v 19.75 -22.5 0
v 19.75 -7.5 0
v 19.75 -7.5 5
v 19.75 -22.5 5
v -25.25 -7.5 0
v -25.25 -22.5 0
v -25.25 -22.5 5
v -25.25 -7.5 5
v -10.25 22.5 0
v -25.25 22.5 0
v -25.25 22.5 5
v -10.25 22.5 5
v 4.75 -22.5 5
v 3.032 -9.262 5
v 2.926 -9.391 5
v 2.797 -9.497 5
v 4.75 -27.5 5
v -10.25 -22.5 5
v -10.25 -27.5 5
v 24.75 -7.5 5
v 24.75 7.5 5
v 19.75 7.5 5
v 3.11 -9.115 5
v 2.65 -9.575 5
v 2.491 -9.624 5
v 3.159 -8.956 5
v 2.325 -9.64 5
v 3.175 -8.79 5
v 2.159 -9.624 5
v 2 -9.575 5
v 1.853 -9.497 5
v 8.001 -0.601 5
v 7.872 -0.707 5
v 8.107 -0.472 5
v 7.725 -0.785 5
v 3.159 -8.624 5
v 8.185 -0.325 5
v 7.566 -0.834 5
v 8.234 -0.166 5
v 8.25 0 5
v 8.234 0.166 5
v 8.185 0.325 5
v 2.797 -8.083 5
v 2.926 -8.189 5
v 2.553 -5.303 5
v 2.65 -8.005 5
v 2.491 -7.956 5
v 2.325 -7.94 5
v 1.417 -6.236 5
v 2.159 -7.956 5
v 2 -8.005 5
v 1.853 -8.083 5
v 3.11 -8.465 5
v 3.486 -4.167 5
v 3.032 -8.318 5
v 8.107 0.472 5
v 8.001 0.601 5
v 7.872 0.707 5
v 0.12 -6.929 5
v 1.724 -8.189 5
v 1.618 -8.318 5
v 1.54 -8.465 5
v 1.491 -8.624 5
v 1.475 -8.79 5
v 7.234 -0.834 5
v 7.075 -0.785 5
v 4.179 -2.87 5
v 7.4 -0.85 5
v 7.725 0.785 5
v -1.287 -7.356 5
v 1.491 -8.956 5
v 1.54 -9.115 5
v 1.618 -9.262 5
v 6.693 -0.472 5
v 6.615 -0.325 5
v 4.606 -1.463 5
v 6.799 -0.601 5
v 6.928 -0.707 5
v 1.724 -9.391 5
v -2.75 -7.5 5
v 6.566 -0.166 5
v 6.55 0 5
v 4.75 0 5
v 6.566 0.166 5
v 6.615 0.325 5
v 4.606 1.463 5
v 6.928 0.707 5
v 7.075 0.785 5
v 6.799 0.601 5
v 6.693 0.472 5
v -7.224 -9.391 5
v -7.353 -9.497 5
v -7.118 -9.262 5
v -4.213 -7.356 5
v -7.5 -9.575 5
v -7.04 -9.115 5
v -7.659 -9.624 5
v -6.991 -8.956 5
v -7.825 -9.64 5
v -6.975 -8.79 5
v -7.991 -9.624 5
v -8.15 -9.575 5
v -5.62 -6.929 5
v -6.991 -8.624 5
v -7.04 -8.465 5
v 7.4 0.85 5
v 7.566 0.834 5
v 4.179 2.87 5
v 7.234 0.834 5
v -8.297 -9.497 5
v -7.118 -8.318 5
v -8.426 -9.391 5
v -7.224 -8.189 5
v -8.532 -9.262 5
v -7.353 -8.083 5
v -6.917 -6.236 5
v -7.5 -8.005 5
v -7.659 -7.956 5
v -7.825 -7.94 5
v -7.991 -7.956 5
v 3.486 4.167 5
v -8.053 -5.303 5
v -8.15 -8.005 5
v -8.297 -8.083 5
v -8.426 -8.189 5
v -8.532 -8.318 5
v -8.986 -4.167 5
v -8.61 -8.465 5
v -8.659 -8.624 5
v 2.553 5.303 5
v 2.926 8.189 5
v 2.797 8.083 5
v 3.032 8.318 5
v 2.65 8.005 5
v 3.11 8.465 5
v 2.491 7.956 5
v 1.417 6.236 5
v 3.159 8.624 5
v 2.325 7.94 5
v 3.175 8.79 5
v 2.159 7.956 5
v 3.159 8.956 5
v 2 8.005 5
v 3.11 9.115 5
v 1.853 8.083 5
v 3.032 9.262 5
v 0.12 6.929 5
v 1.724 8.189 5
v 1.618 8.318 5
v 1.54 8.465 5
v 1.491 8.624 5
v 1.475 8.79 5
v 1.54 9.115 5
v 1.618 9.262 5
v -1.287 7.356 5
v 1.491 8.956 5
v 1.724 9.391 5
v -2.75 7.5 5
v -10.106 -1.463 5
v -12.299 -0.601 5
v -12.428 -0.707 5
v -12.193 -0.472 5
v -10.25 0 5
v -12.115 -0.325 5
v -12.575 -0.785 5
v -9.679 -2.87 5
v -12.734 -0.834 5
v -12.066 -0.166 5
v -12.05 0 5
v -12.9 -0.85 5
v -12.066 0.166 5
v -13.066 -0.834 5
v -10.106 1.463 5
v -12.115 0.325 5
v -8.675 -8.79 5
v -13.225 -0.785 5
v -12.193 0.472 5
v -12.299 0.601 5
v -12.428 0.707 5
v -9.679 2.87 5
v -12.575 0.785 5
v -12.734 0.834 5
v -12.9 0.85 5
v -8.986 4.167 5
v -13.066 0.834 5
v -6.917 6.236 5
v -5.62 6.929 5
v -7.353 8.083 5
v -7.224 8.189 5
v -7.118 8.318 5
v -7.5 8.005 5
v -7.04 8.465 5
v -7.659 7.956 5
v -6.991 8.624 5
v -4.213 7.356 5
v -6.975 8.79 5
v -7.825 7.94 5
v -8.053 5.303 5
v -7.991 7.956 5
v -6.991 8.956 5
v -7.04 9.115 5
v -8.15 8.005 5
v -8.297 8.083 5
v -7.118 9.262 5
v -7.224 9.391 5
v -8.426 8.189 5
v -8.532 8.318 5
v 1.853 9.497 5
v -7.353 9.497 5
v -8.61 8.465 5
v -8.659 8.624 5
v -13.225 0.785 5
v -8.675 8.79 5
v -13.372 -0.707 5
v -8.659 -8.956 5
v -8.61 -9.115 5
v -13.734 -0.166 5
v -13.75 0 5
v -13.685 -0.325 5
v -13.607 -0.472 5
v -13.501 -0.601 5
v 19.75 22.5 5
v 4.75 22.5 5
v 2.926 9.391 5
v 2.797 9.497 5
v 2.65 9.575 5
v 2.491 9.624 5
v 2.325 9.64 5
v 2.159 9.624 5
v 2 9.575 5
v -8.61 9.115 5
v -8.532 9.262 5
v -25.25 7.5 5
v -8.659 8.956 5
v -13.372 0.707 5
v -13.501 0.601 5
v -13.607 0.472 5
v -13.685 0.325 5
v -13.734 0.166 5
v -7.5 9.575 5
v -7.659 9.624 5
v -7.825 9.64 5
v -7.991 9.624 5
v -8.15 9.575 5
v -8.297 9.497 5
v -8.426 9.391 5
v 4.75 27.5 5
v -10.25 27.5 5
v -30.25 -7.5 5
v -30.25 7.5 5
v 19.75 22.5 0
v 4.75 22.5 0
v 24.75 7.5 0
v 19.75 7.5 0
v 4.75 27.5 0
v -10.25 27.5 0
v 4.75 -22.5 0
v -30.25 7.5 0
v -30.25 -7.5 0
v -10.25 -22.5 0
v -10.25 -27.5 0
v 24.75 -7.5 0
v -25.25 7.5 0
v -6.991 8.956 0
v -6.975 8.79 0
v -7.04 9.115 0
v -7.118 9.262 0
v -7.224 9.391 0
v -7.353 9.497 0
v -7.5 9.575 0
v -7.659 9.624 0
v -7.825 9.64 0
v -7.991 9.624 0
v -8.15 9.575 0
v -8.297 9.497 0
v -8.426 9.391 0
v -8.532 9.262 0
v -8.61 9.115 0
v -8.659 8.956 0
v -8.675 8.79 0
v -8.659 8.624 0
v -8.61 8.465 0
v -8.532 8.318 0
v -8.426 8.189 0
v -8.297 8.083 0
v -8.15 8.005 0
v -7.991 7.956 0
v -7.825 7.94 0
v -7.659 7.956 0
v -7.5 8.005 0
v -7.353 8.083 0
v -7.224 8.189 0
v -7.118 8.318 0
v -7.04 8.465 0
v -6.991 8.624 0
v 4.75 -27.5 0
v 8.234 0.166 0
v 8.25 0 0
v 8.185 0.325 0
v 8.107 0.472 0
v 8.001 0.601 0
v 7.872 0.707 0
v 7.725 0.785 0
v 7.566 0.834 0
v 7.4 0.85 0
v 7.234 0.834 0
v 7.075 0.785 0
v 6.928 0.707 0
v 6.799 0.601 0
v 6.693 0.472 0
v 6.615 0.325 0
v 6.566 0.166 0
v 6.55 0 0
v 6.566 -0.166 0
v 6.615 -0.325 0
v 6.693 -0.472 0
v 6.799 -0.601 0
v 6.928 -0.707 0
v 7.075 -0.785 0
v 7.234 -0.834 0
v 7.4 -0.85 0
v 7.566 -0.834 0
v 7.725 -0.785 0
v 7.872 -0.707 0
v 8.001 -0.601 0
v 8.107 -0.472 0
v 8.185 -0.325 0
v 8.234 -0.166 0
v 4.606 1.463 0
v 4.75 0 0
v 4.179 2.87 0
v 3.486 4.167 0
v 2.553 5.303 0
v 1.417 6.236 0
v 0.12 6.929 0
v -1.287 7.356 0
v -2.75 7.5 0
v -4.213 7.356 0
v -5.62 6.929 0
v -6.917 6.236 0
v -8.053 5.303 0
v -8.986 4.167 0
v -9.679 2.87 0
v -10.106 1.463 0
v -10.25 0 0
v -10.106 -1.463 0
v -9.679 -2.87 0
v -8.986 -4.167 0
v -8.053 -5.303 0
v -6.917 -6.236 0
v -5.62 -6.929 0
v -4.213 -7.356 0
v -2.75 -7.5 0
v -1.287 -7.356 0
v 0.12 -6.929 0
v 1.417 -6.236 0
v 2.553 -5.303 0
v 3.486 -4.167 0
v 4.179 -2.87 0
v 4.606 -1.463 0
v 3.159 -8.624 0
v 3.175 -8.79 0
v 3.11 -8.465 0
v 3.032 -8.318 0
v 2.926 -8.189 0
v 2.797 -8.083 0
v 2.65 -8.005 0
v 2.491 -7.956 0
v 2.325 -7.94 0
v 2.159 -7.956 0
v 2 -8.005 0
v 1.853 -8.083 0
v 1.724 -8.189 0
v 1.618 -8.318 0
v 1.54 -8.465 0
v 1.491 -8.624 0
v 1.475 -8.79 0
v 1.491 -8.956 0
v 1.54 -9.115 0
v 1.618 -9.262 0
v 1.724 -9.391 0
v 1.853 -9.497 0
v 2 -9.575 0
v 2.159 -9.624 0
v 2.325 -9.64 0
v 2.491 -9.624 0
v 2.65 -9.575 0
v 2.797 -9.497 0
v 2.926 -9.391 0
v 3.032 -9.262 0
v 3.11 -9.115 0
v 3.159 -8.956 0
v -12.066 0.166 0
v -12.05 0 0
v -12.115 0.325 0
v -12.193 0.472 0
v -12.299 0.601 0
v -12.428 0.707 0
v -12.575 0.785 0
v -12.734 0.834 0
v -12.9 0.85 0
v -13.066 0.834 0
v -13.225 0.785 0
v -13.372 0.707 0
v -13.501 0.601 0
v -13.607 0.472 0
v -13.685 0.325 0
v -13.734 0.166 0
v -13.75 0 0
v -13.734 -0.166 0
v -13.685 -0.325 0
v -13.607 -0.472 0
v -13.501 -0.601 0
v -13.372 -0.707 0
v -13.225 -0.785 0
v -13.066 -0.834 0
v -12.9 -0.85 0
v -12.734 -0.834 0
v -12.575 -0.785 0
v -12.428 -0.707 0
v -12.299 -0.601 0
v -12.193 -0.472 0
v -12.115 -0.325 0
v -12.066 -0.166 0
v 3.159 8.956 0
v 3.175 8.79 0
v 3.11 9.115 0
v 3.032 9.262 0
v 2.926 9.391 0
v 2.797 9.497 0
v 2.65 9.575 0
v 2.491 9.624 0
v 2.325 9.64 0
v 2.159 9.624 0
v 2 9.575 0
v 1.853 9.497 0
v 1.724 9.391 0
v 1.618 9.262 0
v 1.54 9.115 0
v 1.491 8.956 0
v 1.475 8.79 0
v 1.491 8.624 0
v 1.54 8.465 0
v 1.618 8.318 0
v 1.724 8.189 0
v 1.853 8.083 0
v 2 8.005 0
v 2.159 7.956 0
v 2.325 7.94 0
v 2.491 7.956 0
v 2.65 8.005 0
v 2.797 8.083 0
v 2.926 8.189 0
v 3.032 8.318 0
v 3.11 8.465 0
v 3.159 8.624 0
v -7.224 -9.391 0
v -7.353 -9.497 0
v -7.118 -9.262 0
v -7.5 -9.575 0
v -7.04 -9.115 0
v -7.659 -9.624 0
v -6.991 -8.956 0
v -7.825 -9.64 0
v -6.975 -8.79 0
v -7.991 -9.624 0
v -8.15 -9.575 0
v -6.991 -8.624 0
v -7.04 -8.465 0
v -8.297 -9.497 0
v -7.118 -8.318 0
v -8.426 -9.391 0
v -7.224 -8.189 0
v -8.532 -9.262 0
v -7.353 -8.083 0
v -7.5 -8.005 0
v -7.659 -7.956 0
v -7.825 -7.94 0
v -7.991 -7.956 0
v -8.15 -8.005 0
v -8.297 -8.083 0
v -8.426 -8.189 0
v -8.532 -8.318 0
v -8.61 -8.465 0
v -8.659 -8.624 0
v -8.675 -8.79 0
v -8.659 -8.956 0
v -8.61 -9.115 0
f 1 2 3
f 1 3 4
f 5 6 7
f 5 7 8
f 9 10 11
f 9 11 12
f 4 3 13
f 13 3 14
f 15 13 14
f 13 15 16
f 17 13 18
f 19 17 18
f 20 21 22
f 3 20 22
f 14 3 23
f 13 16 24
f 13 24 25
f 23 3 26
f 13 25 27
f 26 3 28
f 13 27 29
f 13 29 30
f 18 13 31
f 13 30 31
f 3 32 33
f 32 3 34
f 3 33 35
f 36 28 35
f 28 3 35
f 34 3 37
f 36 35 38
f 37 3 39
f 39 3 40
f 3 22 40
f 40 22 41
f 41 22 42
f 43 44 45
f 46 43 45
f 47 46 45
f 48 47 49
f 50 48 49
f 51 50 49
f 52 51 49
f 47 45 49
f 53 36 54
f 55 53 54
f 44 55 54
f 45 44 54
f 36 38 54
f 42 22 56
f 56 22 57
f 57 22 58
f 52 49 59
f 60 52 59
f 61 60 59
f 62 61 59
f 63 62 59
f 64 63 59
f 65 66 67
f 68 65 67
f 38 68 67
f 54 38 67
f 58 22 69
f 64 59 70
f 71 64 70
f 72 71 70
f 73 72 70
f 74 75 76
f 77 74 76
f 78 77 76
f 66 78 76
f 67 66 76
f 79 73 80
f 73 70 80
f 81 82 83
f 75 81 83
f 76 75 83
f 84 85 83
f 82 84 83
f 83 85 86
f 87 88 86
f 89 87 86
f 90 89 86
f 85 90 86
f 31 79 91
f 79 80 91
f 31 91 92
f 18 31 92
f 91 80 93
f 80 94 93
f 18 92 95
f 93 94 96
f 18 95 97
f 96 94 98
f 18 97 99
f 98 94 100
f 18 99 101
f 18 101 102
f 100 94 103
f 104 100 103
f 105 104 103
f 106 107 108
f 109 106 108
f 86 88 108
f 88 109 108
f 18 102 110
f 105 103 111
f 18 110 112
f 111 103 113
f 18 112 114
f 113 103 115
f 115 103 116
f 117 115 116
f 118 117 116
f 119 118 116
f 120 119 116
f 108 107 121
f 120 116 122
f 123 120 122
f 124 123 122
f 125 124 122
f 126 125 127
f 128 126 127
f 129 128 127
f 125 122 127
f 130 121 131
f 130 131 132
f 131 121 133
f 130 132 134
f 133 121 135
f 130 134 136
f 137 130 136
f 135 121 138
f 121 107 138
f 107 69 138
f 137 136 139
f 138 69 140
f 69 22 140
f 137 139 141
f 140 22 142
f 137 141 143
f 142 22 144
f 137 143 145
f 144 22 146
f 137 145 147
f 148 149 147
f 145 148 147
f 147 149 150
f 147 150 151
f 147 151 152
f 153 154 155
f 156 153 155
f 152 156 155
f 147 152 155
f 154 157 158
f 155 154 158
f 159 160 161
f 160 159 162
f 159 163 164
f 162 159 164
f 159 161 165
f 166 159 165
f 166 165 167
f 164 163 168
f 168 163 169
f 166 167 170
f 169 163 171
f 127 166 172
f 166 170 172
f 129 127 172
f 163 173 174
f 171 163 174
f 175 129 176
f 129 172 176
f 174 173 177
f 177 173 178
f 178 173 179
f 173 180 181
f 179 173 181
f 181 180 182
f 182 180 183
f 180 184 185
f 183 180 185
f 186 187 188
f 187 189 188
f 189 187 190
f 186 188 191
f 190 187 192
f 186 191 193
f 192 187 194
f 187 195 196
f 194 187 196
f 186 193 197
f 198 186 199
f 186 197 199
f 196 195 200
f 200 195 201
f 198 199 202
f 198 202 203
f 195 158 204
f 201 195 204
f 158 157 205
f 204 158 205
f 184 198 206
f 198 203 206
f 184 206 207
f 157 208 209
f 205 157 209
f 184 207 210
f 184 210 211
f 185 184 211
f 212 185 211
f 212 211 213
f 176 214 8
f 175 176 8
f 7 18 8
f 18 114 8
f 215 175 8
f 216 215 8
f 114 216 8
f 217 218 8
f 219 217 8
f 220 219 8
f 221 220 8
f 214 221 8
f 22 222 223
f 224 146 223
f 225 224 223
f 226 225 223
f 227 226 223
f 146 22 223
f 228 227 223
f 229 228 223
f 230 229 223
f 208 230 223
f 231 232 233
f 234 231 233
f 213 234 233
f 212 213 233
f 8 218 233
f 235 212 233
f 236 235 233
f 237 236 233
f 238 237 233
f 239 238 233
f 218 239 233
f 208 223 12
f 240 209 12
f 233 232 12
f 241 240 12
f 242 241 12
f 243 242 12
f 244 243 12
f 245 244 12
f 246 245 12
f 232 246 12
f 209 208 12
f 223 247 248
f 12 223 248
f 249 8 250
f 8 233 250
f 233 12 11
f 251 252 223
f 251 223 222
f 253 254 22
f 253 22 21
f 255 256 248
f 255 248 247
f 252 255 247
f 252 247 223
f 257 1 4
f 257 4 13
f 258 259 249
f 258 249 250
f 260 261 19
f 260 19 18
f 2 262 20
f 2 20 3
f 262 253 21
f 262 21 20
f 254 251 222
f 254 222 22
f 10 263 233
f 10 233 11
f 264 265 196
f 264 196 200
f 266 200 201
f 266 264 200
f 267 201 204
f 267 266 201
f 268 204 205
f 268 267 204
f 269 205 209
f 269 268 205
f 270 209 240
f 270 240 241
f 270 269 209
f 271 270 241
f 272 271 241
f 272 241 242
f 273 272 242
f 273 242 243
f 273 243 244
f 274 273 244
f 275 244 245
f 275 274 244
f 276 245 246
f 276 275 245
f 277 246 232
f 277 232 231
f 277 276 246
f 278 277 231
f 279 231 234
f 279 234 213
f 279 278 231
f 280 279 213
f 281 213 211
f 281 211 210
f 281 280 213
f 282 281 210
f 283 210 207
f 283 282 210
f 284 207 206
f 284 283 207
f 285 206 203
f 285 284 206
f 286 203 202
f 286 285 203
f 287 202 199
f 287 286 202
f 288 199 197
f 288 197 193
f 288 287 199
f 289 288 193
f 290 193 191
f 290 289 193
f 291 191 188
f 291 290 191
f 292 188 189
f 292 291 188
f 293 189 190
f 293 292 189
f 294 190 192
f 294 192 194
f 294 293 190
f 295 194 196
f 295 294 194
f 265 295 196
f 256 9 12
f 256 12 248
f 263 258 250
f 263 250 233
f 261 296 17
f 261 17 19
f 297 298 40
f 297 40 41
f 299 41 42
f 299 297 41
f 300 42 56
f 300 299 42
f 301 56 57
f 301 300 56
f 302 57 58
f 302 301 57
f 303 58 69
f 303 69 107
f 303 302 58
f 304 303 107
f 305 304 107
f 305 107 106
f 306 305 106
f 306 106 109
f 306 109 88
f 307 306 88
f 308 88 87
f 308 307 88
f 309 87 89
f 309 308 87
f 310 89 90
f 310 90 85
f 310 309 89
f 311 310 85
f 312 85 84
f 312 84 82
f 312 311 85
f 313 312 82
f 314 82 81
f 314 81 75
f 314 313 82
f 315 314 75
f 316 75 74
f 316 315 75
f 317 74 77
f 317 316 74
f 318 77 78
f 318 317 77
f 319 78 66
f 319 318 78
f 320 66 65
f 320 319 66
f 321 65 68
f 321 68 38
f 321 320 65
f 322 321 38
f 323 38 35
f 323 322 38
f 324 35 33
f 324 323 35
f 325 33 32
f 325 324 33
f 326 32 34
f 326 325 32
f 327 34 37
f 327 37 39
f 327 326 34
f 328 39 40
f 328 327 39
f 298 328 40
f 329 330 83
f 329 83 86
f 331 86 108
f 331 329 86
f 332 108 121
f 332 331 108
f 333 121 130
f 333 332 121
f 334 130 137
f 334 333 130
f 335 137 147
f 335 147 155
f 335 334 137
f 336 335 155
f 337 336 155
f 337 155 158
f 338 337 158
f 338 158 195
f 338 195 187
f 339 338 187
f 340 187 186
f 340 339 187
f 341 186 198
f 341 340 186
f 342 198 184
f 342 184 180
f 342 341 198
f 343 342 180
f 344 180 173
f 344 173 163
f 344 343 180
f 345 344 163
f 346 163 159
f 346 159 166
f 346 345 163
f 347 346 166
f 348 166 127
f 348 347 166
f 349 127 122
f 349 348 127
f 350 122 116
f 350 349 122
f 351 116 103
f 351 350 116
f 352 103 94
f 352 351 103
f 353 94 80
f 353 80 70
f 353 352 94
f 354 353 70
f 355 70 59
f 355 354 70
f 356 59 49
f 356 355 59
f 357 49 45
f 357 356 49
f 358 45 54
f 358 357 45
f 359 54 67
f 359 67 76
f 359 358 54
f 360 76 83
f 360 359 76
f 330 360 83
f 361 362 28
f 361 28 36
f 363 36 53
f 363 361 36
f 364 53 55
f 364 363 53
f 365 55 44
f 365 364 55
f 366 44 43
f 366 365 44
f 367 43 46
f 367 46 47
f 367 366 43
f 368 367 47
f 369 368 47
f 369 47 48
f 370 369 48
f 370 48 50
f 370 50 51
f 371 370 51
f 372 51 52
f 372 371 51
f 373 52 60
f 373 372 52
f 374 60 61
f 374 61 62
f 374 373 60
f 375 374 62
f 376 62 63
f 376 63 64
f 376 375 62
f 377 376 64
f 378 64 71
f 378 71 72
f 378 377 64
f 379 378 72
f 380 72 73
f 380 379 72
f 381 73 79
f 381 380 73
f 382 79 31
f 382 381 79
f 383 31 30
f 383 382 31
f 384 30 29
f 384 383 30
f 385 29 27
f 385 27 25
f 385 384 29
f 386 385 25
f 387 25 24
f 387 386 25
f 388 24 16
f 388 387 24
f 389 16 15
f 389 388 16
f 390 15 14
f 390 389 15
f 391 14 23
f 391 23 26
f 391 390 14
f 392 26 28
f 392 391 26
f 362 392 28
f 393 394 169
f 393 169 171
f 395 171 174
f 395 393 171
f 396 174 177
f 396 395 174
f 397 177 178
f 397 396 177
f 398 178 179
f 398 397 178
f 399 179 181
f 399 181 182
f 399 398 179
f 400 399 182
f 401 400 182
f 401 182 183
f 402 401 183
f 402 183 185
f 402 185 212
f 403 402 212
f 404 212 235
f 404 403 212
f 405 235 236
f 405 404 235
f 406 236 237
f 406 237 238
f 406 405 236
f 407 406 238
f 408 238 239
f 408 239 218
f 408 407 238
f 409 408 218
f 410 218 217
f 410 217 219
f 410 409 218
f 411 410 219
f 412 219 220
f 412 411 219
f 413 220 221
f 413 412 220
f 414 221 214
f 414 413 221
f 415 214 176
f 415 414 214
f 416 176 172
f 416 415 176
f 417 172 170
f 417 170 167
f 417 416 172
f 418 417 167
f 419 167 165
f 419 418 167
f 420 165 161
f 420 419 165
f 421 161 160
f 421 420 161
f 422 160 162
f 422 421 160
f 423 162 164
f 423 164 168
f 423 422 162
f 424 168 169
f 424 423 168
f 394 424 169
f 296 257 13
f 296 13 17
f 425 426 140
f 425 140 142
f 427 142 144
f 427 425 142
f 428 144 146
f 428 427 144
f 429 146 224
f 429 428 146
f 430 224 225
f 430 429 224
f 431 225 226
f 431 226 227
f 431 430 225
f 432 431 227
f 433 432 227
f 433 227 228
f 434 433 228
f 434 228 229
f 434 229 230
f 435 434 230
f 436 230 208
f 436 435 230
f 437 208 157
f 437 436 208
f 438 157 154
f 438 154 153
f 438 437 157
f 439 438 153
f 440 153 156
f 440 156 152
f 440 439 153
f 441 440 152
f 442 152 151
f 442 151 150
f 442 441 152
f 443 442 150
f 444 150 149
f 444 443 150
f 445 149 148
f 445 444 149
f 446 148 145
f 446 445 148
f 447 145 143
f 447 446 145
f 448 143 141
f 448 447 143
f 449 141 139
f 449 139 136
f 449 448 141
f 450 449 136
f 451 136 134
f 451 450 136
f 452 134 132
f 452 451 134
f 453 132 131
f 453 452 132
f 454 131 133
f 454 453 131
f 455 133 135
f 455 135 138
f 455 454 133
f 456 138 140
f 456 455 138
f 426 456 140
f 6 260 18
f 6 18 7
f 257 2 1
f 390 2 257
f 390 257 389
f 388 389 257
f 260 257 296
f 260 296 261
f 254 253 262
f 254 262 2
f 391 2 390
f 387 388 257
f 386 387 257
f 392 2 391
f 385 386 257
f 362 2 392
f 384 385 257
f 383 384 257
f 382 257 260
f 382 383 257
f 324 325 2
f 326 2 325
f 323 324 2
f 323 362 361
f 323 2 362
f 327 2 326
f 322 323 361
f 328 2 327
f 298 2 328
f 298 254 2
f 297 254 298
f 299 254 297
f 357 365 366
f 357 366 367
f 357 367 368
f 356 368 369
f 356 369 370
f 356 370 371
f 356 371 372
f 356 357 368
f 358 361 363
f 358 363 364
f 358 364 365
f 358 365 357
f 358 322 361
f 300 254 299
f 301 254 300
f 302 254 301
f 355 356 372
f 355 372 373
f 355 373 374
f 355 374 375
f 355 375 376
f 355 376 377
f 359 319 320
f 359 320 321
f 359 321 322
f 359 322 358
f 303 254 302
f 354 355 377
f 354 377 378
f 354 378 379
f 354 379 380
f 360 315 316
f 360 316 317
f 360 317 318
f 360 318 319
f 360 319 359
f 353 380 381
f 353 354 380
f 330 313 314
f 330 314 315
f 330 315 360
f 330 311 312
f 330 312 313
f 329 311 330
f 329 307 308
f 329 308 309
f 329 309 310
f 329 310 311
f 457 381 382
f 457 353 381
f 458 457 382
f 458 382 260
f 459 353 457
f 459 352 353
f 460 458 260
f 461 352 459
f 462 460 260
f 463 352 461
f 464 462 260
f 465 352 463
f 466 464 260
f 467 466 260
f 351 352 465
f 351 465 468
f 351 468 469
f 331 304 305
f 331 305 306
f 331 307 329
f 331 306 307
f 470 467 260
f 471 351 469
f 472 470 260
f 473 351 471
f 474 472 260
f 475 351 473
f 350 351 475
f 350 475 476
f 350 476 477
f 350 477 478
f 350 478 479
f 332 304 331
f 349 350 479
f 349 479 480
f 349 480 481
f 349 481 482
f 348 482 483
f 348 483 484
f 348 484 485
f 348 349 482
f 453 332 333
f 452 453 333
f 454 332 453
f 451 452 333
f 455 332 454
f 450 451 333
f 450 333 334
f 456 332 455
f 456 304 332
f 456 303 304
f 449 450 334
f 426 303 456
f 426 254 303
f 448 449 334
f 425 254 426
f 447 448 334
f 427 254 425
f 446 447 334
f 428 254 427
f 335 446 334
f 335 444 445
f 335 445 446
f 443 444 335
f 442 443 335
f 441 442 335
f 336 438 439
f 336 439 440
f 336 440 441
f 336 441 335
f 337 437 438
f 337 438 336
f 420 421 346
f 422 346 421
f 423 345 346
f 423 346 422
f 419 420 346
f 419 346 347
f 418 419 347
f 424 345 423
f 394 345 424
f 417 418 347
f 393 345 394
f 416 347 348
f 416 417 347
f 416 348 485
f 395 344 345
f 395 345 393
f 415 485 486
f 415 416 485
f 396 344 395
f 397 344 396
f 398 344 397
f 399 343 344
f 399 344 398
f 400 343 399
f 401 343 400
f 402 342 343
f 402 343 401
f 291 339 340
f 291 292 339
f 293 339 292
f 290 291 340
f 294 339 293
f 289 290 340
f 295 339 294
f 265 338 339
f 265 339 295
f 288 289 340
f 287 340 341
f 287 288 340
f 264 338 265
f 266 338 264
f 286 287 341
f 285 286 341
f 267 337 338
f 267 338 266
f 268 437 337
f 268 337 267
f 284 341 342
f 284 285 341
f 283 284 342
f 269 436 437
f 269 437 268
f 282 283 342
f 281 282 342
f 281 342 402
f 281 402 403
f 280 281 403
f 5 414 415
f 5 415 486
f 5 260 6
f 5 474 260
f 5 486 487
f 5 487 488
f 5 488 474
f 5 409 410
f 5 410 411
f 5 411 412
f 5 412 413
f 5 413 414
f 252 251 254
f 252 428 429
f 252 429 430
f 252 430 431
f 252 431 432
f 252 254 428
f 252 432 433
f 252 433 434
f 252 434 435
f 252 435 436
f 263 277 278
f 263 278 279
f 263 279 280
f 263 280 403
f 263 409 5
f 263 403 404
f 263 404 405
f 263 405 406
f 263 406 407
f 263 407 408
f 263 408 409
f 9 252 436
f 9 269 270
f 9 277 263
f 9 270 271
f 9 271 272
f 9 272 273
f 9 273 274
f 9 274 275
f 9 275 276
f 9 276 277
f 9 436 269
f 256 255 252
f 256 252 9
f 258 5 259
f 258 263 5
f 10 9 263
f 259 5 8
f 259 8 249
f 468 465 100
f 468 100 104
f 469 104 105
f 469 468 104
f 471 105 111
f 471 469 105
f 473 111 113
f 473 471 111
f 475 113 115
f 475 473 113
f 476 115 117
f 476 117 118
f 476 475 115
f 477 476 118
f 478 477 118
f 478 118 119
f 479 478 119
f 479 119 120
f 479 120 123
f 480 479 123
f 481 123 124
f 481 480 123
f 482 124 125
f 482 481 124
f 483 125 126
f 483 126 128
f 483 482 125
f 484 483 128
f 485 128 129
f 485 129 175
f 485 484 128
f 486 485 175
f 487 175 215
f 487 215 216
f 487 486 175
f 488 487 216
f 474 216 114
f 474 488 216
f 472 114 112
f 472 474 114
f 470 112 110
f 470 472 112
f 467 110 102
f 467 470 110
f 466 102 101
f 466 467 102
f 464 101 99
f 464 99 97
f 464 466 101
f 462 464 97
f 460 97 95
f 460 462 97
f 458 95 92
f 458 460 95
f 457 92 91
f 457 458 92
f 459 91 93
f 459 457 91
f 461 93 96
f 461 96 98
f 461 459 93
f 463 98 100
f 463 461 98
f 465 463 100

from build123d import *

# Parameters (mm, degrees)
BOSS_EXTRUDE1_DEPTH = 5
CAVITY1_OUTLINE_R   = 0.85
CAVITY1_OUTLINE_R_2 = 7.5
CAVITY1_DEPTH       = 5


# Read off the part's stored shape, not the designer's step: Cavity1
with BuildPart() as part:
    # Sketch1 → Boss-Extrude1 (new body)
    with BuildSketch(Plane.XY):
        Polygon((-25.25, 7.5), (-25.25, 22.5), (-10.25, 22.5), (-10.25, 27.5), (4.75, 27.5), (4.75, 22.5), (19.75, 22.5), (19.75, 7.5), (24.75, 7.5), (24.75, -7.5), (19.75, -7.5), (19.75, -22.5), (4.75, -22.5), (4.75, -27.5), (-10.25, -27.5), (-10.25, -22.5), (-25.25, -22.5), (-25.25, -7.5), (-30.25, -7.5), (-30.25, 7.5), align=None)
    extrude(amount=BOSS_EXTRUDE1_DEPTH)

    # Cavity1 outline → Cavity1 (cut)
    with BuildSketch(Plane.XY):
        with Locations((2.325, 8.790157848)):
            Circle(CAVITY1_OUTLINE_R)
        with Locations((-7.825, 8.790157848)):
            Circle(CAVITY1_OUTLINE_R)
        with Locations((-12.9, 0)):
            Circle(CAVITY1_OUTLINE_R)
        with Locations((-7.825, -8.790157848)):
            Circle(CAVITY1_OUTLINE_R)
        with Locations((2.325, -8.790157848)):
            Circle(CAVITY1_OUTLINE_R)
        with Locations((7.4, 0)):
            Circle(CAVITY1_OUTLINE_R)
        with Locations((-2.75, 0)):
            Circle(CAVITY1_OUTLINE_R_2)
    extrude(amount=CAVITY1_DEPTH, mode=Mode.SUBTRACT)


solid = part.part
